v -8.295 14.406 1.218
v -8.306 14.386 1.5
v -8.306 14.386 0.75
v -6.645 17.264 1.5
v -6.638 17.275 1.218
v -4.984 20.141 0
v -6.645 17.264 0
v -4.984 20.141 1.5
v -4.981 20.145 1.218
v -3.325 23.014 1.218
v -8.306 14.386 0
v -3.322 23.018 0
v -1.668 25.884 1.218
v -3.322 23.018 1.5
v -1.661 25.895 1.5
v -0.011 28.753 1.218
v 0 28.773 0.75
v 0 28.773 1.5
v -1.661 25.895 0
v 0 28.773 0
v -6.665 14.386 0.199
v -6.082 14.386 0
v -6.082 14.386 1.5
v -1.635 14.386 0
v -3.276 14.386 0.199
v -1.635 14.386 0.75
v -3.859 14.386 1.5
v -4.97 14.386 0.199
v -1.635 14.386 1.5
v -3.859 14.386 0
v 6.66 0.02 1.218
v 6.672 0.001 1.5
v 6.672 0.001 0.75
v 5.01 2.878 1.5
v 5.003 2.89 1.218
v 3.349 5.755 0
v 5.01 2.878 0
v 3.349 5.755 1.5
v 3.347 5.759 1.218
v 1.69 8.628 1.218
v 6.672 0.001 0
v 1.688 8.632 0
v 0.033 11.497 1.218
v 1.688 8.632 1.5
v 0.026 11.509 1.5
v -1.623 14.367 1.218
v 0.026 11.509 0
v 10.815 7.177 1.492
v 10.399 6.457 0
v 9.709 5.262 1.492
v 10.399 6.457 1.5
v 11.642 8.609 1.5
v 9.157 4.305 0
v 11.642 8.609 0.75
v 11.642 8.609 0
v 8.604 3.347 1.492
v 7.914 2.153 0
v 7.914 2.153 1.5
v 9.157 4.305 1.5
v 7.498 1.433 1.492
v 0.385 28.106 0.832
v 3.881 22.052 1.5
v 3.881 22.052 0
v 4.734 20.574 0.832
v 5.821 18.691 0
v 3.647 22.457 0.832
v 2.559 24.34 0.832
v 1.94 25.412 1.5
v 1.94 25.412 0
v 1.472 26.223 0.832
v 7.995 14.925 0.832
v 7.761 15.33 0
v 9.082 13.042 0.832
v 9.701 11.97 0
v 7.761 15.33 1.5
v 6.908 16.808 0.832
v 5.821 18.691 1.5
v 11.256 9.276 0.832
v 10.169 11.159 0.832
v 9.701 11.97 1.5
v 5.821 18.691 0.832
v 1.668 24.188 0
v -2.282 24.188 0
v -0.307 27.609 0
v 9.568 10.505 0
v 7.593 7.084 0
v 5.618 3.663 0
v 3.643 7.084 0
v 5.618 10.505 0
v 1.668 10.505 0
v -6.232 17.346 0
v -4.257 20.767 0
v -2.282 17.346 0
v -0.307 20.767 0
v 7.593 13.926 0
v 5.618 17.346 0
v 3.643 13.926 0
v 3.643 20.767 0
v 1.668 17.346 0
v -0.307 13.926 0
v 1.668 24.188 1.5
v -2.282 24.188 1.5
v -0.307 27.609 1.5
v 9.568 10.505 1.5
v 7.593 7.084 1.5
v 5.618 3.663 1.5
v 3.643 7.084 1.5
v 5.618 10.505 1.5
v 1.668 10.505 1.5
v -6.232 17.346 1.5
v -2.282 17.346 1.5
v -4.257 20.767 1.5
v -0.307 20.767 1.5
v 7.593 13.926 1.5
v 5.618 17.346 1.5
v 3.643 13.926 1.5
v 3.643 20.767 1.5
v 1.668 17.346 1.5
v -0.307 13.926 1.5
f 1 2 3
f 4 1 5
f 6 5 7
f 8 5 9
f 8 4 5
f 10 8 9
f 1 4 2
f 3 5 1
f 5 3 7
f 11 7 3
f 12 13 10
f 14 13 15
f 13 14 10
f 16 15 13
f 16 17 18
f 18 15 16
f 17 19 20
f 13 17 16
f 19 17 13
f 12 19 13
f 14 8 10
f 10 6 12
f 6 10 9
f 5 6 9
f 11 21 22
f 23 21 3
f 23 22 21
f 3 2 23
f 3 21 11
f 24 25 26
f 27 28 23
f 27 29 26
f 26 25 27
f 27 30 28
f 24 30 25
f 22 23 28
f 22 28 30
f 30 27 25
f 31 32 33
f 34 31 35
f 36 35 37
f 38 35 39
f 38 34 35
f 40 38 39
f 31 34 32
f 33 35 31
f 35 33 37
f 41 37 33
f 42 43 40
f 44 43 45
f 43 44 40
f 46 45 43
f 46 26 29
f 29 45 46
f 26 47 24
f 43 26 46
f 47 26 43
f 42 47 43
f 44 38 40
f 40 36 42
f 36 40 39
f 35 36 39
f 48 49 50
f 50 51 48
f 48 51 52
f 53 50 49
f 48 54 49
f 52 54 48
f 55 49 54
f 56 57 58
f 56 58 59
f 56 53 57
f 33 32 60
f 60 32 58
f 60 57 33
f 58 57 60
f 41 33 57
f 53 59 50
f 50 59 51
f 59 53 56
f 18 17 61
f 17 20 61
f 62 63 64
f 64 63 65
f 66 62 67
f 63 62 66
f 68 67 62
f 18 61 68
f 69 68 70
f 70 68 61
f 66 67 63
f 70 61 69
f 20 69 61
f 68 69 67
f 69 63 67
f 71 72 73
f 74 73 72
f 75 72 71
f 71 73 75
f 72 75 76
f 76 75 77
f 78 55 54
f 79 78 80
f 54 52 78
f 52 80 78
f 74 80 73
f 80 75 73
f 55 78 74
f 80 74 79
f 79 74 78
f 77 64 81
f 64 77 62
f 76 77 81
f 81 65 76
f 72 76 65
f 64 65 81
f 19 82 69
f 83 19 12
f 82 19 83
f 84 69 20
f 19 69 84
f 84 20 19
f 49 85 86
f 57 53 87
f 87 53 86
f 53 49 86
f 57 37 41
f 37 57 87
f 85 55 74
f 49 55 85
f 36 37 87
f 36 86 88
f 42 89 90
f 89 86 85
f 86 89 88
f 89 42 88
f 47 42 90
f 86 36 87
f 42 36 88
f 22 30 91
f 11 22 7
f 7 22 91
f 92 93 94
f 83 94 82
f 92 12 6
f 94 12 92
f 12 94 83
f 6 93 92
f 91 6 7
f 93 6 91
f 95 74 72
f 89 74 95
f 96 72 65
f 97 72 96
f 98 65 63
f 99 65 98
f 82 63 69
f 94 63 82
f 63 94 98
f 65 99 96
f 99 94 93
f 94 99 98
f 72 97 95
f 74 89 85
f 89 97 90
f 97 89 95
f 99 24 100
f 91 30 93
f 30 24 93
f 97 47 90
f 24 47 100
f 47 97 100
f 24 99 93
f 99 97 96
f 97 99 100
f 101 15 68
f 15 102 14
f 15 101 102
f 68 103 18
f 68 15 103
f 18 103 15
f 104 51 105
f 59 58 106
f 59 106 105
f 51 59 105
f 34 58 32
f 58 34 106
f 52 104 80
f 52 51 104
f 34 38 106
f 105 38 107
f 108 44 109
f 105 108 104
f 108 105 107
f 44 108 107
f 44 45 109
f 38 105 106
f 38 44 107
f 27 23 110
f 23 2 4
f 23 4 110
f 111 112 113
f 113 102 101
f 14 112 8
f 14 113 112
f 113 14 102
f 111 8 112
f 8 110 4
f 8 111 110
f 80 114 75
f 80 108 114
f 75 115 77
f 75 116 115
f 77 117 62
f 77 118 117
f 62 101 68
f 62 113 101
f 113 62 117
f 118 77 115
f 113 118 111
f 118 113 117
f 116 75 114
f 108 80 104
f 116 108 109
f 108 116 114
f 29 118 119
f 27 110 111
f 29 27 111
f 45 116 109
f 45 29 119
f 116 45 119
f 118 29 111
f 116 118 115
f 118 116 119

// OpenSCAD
// CSG file generated from FreeCAD 0.20.29177 (Git)
group() {
 group(){
polyhedron ( points = [[0.000000,28.772774,0.000000],[0.000000,28.772774,1.500000],[-8.305984,14.386387,0.000000],[-8.305984,14.386387,1.500000],[-1.634803,14.386387,0.000000],[-1.634803,14.386387,1.500000],[6.671575,0.000681,0.000000],[6.671575,0.000681,1.500000],[11.641575,8.608974,0.000000],[11.641575,8.608974,1.500000],[0.000000,28.772774,0.750000],[-8.305984,14.386387,0.750000],[-1.661197,25.895496,0.000000],[-3.322394,23.018219,0.000000],[-4.983591,20.140942,0.000000],[-6.644787,17.263664,0.000000],[-1.661197,25.895496,1.500000],[-3.322394,23.018219,1.500000],[-4.983591,20.140942,1.500000],[-6.644787,17.263664,1.500000],[-1.634803,14.386387,0.750000],[-3.858530,14.386387,0.000000],[-6.082257,14.386387,0.000000],[-3.858530,14.386387,1.500000],[-6.082257,14.386387,1.500000],[6.671575,0.000681,0.750000],[0.026473,11.509246,0.000000],[1.687748,8.632105,0.000000],[3.349024,5.754963,0.000000],[5.010299,2.877822,0.000000],[0.026473,11.509246,1.500000],[1.687748,8.632105,1.500000],[3.349024,5.754963,1.500000],[5.010299,2.877822,1.500000],[11.641575,8.608974,0.750000],[7.914075,2.152754,0.000000],[9.156575,4.304828,0.000000],[10.399075,6.456901,0.000000],[7.914075,2.152754,1.500000],[9.156575,4.304828,1.500000],[10.399075,6.456901,1.500000],[9.701312,11.969607,0.000000],[7.761050,15.330240,0.000000],[5.820787,18.690874,0.000000],[3.880525,22.051508,0.000000],[1.940263,25.412140,0.000000],[9.701312,11.969607,1.500000],[7.761050,15.330240,1.500000],[5.820787,18.690874,1.500000],[3.880525,22.051508,1.500000],[1.940263,25.412140,1.500000],[-8.294643,14.406031,1.218004],[-6.637982,17.275450,1.218004],[-4.981322,20.144871,1.218004],[-3.324662,23.014290,1.218004],[-1.668001,25.883711,1.218004],[-0.011341,28.753130,1.218004],[-3.275549,14.386387,0.198679],[-6.665238,14.386387,0.198679],[-4.970394,14.386387,0.198679],[6.660243,0.020308,1.218009],[5.003500,2.889598,1.218009],[3.346757,5.758889,1.218009],[1.690015,8.628180,1.218009],[0.033272,11.497470,1.218009],[-1.623471,14.366760,1.218009],[10.814733,7.176841,1.491991],[9.709294,5.262165,1.491991],[8.603856,3.347490,1.491991],[7.498417,1.432814,1.491991],[0.385143,28.105688,0.831968],[2.559401,24.339762,0.831968],[4.733658,20.573837,0.831968],[6.907917,16.807911,0.831968],[9.082174,13.041986,0.831968],[11.256433,9.276061,0.831968],[3.646530,22.456799,0.831968],[1.472272,26.222725,0.831968],[7.995046,14.924949,0.831968],[10.169303,11.159023,0.831968],[5.820787,18.690874,0.831968],[9.567748,10.504763,0.000000],[1.667796,24.187883,0.000000],[-2.282181,17.346323,0.000000],[5.617772,3.663203,0.000000],[1.667796,10.504763,0.000000],[5.617772,17.346323,0.000000],[-0.307193,27.608662,0.000000],[-2.282181,24.187883,0.000000],[7.592760,7.083983,0.000000],[3.642784,7.083983,0.000000],[5.617772,10.504763,0.000000],[-6.232157,17.346323,0.000000],[-4.257169,20.767103,0.000000],[-0.307193,20.767103,0.000000],[7.592760,13.925543,0.000000],[3.642784,20.767103,0.000000],[1.667796,17.346323,0.000000],[3.642784,13.925543,0.000000],[-0.307193,13.925543,0.000000],[9.567748,10.504763,1.500000],[1.667796,24.187883,1.500000],[-2.282181,17.346323,1.500000],[5.617772,3.663203,1.500000],[1.667796,10.504763,1.500000],[5.617772,17.346323,1.500000],[-0.307193,27.608662,1.500000],[-2.282181,24.187883,1.500000],[7.592760,7.083983,1.500000],[3.642784,7.083983,1.500000],[5.617772,10.504763,1.500000],[-6.232157,17.346323,1.500000],[-4.257169,20.767103,1.500000],[-0.307193,20.767103,1.500000],[7.592760,13.925543,1.500000],[3.642784,20.767103,1.500000],[1.667796,17.346323,1.500000],[3.642784,13.925543,1.500000],[-0.307193,13.925543,1.500000]], faces = [[11,3,51],[52,51,19],[15,52,14],[53,52,18],[52,19,18],[53,18,54],[3,19,51],[51,52,11],[15,11,52],[11,15,2],[54,55,13],[16,55,17],[54,17,55],[55,16,56],[1,10,56],[56,16,1],[0,12,10],[56,10,55],[55,10,12],[55,12,13],[54,18,17],[13,14,54],[53,54,14],[53,14,52],[22,58,2],[11,58,24],[58,22,24],[24,3,11],[2,58,11],[20,57,4],[24,59,23],[20,5,23],[23,57,20],[59,21,23],[57,21,4],[59,24,22],[21,59,22],[57,23,21],[25,7,60],[61,60,33],[29,61,28],[62,61,32],[61,33,32],[62,32,63],[7,33,60],[60,61,25],[29,25,61],[25,29,6],[63,64,27],[30,64,31],[63,31,64],[64,30,65],[5,20,65],[65,30,5],[4,26,20],[65,20,64],[64,20,26],[64,26,27],[63,32,31],[27,28,63],[62,63,28],[62,28,61],[67,37,66],[66,40,67],[9,40,66],[37,67,36],[37,34,66],[66,34,9],[34,37,8],[38,35,68],[39,38,68],[35,36,68],[69,7,25],[38,7,69],[25,35,69],[69,35,38],[35,25,6],[67,39,36],[40,39,67],[68,36,39],[70,10,1],[70,0,10],[72,44,49],[43,44,72],[71,49,76],[76,49,44],[49,71,50],[50,70,1],[77,50,45],[70,50,77],[44,71,76],[45,70,77],[70,45,0],[71,45,50],[71,44,45],[74,42,78],[42,74,41],[78,42,47],[47,74,78],[73,47,42],[48,47,73],[34,8,75],[46,75,79],[75,9,34],[75,46,9],[74,46,41],[74,47,46],[41,75,8],[79,41,46],[75,41,79],[80,72,48],[49,48,72],[80,48,73],[73,43,80],[43,73,42],[80,43,72],[45,82,12],[13,12,88],[88,12,82],[0,45,87],[87,45,12],[12,0,87],[89,81,37],[84,36,35],[89,36,84],[89,37,36],[6,29,35],[84,35,29],[41,8,81],[81,8,37],[84,29,28],[90,89,28],[85,91,27],[81,89,91],[90,91,89],[90,27,91],[85,27,26],[84,28,89],[90,28,27],[92,21,22],[15,22,2],[92,22,15],[94,83,93],[82,94,88],[14,13,93],[93,13,94],[88,94,13],[93,83,14],[15,14,92],[92,14,83],[42,41,95],[95,41,91],[43,42,86],[86,42,98],[44,43,96],[96,43,97],[45,44,82],[82,44,94],[96,94,44],[86,97,43],[83,94,97],[96,97,94],[95,98,42],[81,91,41],[85,98,91],[95,91,98],[99,4,97],[83,21,92],[83,4,21],[85,26,98],[99,26,4],[99,98,26],[83,97,4],[86,98,97],[99,97,98],[50,16,101],[17,107,16],[107,101,16],[1,106,50],[106,16,50],[16,106,1],[108,40,100],[103,38,39],[108,103,39],[108,39,40],[7,38,33],[103,33,38],[46,100,9],[100,40,9],[103,32,33],[109,32,108],[104,31,110],[100,110,108],[109,108,110],[109,110,31],[104,30,31],[103,108,32],[109,31,32],[111,24,23],[19,3,24],[111,19,24],[113,112,102],[101,107,113],[18,112,17],[112,113,17],[107,17,113],[112,18,102],[19,111,18],[111,102,18],[47,114,46],[114,110,46],[48,105,47],[105,117,47],[49,115,48],[115,116,48],[50,101,49],[101,113,49],[115,49,113],[105,48,116],[102,116,113],[115,113,116],[114,47,117],[100,46,110],[104,110,117],[114,117,110],[118,116,5],[102,111,23],[102,23,5],[104,117,30],[118,5,30],[118,30,117],[102,5,116],[105,116,117],[118,117,116]]);
}
}
